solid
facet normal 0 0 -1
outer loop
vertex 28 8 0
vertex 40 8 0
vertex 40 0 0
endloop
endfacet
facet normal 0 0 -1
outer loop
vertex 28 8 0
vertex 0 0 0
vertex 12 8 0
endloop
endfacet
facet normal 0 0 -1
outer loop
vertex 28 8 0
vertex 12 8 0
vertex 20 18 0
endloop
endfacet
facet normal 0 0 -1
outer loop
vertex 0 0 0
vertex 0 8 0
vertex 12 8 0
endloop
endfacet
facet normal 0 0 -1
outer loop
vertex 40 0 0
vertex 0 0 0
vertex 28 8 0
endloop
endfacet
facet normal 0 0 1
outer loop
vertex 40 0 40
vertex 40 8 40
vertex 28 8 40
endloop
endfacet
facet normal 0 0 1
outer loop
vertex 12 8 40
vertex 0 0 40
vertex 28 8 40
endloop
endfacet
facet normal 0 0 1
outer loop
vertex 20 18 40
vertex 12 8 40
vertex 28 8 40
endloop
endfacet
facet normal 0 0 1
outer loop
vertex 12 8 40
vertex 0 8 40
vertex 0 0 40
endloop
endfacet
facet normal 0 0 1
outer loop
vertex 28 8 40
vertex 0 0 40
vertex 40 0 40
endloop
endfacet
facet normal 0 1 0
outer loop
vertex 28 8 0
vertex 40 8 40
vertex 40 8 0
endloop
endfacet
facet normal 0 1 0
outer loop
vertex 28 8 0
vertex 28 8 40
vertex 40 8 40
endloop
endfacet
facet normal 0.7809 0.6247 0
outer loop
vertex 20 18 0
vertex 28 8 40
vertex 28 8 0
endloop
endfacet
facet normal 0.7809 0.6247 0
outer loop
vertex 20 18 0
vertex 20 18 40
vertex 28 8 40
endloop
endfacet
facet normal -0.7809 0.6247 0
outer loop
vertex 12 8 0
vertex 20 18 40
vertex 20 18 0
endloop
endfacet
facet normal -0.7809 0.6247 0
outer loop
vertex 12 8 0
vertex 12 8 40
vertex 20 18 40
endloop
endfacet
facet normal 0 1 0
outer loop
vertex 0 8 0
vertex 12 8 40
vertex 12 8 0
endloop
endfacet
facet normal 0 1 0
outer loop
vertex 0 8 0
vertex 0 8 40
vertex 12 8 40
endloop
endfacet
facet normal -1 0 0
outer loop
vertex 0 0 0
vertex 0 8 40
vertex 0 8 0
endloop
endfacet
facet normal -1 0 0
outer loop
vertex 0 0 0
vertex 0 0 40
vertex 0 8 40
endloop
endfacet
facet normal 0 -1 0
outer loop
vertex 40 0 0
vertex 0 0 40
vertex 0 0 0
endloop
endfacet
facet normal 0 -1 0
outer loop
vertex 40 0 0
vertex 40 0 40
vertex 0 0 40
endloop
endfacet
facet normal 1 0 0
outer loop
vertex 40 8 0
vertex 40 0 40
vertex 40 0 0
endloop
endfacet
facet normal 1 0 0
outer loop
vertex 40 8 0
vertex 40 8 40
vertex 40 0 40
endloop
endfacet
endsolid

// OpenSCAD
$fn = 32;

// ----------------------------------------------------------------------
// V guide rail: vrib, 40 mm wide
// ----------------------------------------------------------------------

// --- parameters (mm) ---
rail_w = 40;              // rail width, X
base_t = 8;               // base plate thickness
v_depth = 10;             // V feature depth / height
v_half_w = 8;             // half width of the V at the base face
plate_t = 40;             // rail length, Z (the extrusion height)

profile = [[0, 0], [40, 0], [40, 8], [28, 8], [20, 18], [12, 8], [0, 8]];  // primary outline, 7 points, counter clockwise

// --- the one profile operation ---
linear_extrude(height = plate_t) polygon(points = profile);
